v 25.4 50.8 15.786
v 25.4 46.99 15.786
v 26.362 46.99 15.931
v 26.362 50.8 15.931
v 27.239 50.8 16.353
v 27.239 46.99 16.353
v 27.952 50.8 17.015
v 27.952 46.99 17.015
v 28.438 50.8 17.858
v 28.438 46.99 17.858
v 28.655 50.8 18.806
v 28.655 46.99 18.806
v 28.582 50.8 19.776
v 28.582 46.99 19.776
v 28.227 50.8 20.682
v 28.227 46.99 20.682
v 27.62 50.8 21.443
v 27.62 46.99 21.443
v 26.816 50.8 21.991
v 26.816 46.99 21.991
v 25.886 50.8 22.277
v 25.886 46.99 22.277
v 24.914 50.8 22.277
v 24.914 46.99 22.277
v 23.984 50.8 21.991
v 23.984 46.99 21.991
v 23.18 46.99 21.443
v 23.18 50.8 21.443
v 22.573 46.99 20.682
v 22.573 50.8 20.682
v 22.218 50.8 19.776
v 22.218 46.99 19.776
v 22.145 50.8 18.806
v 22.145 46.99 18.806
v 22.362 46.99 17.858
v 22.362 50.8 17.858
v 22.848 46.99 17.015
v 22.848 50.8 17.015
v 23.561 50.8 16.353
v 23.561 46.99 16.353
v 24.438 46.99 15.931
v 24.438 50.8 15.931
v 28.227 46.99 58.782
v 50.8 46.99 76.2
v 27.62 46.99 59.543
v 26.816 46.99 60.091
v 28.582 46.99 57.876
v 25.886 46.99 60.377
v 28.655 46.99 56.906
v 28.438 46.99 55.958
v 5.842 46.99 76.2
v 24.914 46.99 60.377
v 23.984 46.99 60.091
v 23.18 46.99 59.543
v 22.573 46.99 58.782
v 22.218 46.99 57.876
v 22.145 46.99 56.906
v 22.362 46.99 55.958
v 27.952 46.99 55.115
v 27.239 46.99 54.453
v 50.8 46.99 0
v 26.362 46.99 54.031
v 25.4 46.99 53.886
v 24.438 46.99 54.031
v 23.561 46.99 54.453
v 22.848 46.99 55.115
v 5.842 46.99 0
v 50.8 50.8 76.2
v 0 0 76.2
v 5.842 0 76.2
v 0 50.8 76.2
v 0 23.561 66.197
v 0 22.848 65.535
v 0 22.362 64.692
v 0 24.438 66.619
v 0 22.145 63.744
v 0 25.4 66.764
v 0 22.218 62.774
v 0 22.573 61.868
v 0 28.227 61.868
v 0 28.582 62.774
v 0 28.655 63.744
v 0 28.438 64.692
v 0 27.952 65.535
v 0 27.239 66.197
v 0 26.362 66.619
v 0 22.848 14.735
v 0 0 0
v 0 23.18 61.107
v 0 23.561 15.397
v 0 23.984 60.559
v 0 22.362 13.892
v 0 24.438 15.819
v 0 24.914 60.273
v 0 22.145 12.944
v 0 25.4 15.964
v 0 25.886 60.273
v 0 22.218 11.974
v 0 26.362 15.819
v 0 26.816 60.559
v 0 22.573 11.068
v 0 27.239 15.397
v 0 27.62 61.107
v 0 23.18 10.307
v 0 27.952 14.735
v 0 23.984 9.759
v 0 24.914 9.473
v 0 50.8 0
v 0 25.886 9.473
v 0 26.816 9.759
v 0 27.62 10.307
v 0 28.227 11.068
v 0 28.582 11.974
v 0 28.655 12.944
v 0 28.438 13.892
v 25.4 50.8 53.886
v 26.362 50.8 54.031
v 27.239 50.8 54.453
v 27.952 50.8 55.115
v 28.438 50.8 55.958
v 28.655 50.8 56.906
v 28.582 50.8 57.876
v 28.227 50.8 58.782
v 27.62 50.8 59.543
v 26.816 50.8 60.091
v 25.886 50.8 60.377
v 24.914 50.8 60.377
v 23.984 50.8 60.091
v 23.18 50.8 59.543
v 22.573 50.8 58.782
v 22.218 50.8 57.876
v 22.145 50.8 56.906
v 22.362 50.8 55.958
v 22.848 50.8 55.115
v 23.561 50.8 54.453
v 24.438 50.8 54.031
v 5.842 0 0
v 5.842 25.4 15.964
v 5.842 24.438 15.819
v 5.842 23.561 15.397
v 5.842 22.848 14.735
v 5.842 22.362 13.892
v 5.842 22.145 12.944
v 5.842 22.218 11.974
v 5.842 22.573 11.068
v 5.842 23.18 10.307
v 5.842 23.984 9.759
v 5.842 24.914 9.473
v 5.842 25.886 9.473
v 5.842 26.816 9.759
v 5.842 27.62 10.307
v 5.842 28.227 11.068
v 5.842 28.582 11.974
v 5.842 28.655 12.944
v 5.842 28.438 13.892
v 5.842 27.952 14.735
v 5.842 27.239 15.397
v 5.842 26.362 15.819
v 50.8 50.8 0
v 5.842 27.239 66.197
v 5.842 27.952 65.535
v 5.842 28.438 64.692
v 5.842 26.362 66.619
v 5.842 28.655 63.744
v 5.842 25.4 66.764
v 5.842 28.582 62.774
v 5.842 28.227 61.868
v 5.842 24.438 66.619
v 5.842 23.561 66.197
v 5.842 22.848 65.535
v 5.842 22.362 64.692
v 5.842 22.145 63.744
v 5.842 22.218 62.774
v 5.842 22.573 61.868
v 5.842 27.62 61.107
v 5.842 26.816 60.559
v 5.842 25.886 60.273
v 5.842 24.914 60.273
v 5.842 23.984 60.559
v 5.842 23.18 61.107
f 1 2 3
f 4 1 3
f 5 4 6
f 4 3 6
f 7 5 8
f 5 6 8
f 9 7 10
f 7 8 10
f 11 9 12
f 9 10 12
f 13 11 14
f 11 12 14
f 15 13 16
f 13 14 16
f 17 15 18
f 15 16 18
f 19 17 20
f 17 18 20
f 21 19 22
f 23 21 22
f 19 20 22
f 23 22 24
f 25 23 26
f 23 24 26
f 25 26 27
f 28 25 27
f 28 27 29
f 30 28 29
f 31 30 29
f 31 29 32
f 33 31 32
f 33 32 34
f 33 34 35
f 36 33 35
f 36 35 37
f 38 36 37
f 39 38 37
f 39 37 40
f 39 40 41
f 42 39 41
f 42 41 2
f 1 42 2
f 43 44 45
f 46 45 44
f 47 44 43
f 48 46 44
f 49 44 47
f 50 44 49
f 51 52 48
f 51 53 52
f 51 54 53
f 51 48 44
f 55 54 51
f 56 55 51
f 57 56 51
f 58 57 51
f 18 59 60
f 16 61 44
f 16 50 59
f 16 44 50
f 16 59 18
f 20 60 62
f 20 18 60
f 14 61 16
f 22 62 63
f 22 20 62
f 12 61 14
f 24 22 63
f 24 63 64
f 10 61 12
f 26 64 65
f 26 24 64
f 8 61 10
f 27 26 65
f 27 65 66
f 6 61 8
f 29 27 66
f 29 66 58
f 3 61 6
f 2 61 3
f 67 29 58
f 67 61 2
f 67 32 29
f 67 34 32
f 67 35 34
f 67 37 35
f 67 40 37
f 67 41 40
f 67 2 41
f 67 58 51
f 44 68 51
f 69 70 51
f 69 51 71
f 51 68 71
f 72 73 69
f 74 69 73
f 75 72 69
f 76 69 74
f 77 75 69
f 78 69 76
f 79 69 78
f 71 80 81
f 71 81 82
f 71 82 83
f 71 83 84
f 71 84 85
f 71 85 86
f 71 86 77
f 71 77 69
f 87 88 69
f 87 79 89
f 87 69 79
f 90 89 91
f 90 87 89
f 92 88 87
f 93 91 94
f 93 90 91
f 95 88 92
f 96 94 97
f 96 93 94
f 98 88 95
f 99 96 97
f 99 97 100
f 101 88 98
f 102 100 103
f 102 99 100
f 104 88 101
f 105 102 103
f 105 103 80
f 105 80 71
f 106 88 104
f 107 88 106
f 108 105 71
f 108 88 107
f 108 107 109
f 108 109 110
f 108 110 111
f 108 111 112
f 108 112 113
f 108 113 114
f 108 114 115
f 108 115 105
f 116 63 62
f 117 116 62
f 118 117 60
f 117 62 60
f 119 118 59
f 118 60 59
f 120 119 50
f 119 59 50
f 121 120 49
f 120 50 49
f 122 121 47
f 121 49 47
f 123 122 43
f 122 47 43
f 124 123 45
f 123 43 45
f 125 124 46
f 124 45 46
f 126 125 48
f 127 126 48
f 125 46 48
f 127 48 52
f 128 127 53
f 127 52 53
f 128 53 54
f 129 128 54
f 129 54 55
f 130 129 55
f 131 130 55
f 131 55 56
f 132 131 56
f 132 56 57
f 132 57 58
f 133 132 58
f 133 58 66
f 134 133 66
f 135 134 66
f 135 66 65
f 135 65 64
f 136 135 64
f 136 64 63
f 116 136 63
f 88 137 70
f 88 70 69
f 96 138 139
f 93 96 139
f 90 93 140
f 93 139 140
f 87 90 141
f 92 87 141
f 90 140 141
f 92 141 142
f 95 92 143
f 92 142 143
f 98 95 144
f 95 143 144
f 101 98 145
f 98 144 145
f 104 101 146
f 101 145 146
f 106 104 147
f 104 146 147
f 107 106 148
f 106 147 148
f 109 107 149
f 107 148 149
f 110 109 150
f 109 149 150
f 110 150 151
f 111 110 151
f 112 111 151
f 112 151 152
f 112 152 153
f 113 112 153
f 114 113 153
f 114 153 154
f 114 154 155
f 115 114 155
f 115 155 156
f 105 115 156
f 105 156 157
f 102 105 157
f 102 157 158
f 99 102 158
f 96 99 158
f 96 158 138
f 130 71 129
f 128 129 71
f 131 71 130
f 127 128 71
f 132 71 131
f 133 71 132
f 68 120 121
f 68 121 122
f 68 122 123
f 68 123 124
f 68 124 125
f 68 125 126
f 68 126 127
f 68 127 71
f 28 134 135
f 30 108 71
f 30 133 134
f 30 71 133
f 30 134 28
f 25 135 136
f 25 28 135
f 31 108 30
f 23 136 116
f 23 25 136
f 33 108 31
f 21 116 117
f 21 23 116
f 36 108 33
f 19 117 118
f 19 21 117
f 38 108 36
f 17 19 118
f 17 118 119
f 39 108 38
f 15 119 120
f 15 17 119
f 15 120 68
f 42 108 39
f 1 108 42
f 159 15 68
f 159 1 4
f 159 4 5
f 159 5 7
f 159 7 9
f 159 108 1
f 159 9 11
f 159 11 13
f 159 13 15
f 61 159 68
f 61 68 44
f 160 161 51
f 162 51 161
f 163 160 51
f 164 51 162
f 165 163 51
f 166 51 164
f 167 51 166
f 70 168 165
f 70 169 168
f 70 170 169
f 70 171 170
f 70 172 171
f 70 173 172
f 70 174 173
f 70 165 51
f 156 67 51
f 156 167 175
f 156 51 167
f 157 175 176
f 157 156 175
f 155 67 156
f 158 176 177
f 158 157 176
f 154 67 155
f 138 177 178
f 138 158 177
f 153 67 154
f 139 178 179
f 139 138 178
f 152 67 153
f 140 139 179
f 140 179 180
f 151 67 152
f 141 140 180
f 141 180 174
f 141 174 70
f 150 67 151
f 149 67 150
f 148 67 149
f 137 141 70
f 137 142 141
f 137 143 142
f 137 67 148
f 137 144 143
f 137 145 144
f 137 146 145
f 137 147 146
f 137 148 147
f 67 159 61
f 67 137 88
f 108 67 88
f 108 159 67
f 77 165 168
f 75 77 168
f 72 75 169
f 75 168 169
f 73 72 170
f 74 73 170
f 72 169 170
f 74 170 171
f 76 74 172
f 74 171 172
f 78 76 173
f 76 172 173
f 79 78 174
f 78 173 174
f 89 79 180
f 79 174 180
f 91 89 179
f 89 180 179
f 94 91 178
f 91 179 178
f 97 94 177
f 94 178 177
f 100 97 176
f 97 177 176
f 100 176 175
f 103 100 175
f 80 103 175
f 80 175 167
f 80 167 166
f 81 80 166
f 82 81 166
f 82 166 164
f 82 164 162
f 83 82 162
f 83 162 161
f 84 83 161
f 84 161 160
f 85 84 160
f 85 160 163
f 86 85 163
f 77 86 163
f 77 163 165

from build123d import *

# Parameters (mm, degrees)
BOSS_EXTRUDE1_DEPTH                    = 76.2
F_0_257_DIAMETER_HOLE1_D               = 6.5278
F_0_257_DIAMETER_HOLE1_DEPTH           = 5.842
F_0_257_DIAMETER_HOLE1_ON_FACE_2_D     = 6.5278
F_0_257_DIAMETER_HOLE1_ON_FACE_2_DEPTH = 5.842


with BuildPart() as part:
    # Sketch1 → Boss-Extrude1 (new body)
    with BuildSketch(Plane.XY):
        Polygon((0, 0), (0, 50.8), (50.8, 50.8), (50.8, 46.99), (5.842, 46.99), (5.842, 0), align=None)
    extrude(amount=BOSS_EXTRUDE1_DEPTH)

    # F (0.257) Diameter Hole1
    with Locations(Plane(origin=(0, 25.4, 12.7), x_dir=(0, 0, -1), z_dir=(-1, 0, 0))):
        with Locations((0, 0), (-50.8, 0)):
            Hole(F_0_257_DIAMETER_HOLE1_D / 2, depth=F_0_257_DIAMETER_HOLE1_DEPTH)

    # F (0.257) Diameter Hole1 on face 2
    with Locations(Plane(origin=(25.4, 50.8, 19.05), x_dir=(0, 0, 1), z_dir=(0, 1, 0))):
        with Locations((0, 0), (38.1, 0)):
            Hole(F_0_257_DIAMETER_HOLE1_ON_FACE_2_D / 2, depth=F_0_257_DIAMETER_HOLE1_ON_FACE_2_DEPTH)


solid = part.part
